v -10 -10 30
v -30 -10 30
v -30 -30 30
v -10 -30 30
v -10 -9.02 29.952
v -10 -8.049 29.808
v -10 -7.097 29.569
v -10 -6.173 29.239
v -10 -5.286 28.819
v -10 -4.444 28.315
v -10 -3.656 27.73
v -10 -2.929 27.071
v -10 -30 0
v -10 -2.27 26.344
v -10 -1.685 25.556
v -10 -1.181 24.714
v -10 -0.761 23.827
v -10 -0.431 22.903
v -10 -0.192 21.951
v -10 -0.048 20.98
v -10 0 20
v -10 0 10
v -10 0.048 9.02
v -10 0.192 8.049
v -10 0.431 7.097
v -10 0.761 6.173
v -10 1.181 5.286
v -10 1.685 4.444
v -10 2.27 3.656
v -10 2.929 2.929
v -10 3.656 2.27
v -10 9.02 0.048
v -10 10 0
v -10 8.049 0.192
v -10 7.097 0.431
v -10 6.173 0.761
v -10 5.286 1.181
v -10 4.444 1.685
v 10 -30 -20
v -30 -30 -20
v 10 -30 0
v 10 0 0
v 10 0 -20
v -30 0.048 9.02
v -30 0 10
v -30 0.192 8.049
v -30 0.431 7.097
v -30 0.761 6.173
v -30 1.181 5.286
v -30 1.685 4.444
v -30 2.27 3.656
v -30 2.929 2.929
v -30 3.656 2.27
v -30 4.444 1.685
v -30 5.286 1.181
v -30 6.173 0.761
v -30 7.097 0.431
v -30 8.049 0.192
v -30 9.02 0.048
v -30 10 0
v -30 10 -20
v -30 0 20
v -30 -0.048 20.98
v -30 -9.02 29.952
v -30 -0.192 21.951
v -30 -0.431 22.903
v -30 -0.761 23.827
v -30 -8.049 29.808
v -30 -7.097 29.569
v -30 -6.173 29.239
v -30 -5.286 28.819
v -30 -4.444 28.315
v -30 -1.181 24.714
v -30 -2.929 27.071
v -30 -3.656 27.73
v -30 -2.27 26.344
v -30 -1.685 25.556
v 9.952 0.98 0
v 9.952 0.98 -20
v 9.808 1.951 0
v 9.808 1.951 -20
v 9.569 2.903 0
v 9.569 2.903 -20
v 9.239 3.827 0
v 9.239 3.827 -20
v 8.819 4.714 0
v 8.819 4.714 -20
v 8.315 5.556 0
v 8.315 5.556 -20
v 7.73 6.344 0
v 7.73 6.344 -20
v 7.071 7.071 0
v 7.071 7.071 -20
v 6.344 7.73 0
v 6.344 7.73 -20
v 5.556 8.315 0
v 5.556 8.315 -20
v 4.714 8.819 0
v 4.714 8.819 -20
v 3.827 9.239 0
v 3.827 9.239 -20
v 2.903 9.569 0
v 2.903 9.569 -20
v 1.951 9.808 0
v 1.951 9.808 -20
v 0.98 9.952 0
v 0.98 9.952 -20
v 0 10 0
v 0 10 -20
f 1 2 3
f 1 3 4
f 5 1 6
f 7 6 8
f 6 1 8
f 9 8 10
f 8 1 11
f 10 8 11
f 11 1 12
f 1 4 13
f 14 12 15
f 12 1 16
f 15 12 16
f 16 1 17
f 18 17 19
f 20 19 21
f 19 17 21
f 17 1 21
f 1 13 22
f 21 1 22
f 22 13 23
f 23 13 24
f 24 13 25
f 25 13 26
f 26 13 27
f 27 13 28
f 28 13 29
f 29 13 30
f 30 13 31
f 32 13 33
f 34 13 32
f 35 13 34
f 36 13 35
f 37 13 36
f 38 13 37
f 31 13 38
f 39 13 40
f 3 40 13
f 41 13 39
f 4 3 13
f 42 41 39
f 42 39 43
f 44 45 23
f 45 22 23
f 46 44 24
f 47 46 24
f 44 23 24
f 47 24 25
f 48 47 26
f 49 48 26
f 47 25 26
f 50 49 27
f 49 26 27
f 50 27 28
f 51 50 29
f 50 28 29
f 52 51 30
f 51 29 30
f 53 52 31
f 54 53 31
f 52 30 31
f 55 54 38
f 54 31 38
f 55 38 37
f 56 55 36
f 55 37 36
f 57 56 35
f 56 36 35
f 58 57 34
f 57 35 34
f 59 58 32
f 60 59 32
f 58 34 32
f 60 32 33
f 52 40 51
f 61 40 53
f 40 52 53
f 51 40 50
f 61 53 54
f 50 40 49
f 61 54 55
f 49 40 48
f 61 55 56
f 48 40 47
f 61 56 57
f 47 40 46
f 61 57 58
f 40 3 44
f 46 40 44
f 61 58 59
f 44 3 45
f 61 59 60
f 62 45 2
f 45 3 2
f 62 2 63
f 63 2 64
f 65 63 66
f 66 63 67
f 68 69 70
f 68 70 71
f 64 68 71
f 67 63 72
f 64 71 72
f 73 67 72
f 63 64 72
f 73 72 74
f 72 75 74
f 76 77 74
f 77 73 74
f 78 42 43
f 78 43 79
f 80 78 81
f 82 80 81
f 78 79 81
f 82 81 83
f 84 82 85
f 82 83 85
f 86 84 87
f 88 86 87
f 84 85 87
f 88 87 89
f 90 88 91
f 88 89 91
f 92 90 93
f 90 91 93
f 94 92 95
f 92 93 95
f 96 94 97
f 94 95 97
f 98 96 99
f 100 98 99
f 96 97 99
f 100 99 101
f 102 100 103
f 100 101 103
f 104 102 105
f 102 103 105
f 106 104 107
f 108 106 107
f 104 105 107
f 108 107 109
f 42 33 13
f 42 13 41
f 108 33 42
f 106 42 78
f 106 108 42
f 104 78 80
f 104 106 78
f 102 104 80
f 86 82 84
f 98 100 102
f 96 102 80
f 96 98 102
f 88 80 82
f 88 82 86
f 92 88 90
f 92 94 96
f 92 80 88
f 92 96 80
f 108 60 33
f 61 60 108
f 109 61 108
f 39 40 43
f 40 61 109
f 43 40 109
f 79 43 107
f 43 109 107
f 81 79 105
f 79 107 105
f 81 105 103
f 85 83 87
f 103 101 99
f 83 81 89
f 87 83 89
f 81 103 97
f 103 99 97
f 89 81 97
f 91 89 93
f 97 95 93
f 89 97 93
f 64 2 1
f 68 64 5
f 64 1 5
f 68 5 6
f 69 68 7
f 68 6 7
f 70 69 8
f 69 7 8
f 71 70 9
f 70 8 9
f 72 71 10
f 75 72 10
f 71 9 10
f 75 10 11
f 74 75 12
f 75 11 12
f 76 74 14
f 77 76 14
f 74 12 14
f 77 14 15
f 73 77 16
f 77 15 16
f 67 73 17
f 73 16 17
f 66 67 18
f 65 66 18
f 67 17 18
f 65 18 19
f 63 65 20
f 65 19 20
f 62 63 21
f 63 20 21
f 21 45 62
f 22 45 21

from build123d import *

# Parameters (mm, degrees)
SKETCH1_W           = 20
SKETCH1_H           = 30
BOSS_EXTRUDE1_DEPTH = 30
SKETCH2_W           = 40
SKETCH2_H           = 40
BOSS_EXTRUDE2_DEPTH = 20
FILLET1_R           = 10


with BuildPart() as part:
    # Sketch1 → Boss-Extrude1 (new body)
    with BuildSketch(Plane.XY):
        with Locations((-20, -15)):
            Rectangle(SKETCH1_W, SKETCH1_H)
    extrude(amount=BOSS_EXTRUDE1_DEPTH)

    # Sketch2 → Boss-Extrude2 (add)
    with BuildSketch(Plane.XY):
        with Locations((-10, -10)):
            Rectangle(SKETCH2_W, SKETCH2_H)
    extrude(amount=-BOSS_EXTRUDE2_DEPTH)

    # Fillet1
    fillet1_edges = [part.edges().sort_by_distance(p)[0] for p in [
        (-20, 0, 0),
        (10, 10, -10),
        (-20, 0, 30),
    ]]
    fillet(fillet1_edges, radius=FILLET1_R - 0.0001)  # a hair under: the kernel refuses the full size


solid = part.part
